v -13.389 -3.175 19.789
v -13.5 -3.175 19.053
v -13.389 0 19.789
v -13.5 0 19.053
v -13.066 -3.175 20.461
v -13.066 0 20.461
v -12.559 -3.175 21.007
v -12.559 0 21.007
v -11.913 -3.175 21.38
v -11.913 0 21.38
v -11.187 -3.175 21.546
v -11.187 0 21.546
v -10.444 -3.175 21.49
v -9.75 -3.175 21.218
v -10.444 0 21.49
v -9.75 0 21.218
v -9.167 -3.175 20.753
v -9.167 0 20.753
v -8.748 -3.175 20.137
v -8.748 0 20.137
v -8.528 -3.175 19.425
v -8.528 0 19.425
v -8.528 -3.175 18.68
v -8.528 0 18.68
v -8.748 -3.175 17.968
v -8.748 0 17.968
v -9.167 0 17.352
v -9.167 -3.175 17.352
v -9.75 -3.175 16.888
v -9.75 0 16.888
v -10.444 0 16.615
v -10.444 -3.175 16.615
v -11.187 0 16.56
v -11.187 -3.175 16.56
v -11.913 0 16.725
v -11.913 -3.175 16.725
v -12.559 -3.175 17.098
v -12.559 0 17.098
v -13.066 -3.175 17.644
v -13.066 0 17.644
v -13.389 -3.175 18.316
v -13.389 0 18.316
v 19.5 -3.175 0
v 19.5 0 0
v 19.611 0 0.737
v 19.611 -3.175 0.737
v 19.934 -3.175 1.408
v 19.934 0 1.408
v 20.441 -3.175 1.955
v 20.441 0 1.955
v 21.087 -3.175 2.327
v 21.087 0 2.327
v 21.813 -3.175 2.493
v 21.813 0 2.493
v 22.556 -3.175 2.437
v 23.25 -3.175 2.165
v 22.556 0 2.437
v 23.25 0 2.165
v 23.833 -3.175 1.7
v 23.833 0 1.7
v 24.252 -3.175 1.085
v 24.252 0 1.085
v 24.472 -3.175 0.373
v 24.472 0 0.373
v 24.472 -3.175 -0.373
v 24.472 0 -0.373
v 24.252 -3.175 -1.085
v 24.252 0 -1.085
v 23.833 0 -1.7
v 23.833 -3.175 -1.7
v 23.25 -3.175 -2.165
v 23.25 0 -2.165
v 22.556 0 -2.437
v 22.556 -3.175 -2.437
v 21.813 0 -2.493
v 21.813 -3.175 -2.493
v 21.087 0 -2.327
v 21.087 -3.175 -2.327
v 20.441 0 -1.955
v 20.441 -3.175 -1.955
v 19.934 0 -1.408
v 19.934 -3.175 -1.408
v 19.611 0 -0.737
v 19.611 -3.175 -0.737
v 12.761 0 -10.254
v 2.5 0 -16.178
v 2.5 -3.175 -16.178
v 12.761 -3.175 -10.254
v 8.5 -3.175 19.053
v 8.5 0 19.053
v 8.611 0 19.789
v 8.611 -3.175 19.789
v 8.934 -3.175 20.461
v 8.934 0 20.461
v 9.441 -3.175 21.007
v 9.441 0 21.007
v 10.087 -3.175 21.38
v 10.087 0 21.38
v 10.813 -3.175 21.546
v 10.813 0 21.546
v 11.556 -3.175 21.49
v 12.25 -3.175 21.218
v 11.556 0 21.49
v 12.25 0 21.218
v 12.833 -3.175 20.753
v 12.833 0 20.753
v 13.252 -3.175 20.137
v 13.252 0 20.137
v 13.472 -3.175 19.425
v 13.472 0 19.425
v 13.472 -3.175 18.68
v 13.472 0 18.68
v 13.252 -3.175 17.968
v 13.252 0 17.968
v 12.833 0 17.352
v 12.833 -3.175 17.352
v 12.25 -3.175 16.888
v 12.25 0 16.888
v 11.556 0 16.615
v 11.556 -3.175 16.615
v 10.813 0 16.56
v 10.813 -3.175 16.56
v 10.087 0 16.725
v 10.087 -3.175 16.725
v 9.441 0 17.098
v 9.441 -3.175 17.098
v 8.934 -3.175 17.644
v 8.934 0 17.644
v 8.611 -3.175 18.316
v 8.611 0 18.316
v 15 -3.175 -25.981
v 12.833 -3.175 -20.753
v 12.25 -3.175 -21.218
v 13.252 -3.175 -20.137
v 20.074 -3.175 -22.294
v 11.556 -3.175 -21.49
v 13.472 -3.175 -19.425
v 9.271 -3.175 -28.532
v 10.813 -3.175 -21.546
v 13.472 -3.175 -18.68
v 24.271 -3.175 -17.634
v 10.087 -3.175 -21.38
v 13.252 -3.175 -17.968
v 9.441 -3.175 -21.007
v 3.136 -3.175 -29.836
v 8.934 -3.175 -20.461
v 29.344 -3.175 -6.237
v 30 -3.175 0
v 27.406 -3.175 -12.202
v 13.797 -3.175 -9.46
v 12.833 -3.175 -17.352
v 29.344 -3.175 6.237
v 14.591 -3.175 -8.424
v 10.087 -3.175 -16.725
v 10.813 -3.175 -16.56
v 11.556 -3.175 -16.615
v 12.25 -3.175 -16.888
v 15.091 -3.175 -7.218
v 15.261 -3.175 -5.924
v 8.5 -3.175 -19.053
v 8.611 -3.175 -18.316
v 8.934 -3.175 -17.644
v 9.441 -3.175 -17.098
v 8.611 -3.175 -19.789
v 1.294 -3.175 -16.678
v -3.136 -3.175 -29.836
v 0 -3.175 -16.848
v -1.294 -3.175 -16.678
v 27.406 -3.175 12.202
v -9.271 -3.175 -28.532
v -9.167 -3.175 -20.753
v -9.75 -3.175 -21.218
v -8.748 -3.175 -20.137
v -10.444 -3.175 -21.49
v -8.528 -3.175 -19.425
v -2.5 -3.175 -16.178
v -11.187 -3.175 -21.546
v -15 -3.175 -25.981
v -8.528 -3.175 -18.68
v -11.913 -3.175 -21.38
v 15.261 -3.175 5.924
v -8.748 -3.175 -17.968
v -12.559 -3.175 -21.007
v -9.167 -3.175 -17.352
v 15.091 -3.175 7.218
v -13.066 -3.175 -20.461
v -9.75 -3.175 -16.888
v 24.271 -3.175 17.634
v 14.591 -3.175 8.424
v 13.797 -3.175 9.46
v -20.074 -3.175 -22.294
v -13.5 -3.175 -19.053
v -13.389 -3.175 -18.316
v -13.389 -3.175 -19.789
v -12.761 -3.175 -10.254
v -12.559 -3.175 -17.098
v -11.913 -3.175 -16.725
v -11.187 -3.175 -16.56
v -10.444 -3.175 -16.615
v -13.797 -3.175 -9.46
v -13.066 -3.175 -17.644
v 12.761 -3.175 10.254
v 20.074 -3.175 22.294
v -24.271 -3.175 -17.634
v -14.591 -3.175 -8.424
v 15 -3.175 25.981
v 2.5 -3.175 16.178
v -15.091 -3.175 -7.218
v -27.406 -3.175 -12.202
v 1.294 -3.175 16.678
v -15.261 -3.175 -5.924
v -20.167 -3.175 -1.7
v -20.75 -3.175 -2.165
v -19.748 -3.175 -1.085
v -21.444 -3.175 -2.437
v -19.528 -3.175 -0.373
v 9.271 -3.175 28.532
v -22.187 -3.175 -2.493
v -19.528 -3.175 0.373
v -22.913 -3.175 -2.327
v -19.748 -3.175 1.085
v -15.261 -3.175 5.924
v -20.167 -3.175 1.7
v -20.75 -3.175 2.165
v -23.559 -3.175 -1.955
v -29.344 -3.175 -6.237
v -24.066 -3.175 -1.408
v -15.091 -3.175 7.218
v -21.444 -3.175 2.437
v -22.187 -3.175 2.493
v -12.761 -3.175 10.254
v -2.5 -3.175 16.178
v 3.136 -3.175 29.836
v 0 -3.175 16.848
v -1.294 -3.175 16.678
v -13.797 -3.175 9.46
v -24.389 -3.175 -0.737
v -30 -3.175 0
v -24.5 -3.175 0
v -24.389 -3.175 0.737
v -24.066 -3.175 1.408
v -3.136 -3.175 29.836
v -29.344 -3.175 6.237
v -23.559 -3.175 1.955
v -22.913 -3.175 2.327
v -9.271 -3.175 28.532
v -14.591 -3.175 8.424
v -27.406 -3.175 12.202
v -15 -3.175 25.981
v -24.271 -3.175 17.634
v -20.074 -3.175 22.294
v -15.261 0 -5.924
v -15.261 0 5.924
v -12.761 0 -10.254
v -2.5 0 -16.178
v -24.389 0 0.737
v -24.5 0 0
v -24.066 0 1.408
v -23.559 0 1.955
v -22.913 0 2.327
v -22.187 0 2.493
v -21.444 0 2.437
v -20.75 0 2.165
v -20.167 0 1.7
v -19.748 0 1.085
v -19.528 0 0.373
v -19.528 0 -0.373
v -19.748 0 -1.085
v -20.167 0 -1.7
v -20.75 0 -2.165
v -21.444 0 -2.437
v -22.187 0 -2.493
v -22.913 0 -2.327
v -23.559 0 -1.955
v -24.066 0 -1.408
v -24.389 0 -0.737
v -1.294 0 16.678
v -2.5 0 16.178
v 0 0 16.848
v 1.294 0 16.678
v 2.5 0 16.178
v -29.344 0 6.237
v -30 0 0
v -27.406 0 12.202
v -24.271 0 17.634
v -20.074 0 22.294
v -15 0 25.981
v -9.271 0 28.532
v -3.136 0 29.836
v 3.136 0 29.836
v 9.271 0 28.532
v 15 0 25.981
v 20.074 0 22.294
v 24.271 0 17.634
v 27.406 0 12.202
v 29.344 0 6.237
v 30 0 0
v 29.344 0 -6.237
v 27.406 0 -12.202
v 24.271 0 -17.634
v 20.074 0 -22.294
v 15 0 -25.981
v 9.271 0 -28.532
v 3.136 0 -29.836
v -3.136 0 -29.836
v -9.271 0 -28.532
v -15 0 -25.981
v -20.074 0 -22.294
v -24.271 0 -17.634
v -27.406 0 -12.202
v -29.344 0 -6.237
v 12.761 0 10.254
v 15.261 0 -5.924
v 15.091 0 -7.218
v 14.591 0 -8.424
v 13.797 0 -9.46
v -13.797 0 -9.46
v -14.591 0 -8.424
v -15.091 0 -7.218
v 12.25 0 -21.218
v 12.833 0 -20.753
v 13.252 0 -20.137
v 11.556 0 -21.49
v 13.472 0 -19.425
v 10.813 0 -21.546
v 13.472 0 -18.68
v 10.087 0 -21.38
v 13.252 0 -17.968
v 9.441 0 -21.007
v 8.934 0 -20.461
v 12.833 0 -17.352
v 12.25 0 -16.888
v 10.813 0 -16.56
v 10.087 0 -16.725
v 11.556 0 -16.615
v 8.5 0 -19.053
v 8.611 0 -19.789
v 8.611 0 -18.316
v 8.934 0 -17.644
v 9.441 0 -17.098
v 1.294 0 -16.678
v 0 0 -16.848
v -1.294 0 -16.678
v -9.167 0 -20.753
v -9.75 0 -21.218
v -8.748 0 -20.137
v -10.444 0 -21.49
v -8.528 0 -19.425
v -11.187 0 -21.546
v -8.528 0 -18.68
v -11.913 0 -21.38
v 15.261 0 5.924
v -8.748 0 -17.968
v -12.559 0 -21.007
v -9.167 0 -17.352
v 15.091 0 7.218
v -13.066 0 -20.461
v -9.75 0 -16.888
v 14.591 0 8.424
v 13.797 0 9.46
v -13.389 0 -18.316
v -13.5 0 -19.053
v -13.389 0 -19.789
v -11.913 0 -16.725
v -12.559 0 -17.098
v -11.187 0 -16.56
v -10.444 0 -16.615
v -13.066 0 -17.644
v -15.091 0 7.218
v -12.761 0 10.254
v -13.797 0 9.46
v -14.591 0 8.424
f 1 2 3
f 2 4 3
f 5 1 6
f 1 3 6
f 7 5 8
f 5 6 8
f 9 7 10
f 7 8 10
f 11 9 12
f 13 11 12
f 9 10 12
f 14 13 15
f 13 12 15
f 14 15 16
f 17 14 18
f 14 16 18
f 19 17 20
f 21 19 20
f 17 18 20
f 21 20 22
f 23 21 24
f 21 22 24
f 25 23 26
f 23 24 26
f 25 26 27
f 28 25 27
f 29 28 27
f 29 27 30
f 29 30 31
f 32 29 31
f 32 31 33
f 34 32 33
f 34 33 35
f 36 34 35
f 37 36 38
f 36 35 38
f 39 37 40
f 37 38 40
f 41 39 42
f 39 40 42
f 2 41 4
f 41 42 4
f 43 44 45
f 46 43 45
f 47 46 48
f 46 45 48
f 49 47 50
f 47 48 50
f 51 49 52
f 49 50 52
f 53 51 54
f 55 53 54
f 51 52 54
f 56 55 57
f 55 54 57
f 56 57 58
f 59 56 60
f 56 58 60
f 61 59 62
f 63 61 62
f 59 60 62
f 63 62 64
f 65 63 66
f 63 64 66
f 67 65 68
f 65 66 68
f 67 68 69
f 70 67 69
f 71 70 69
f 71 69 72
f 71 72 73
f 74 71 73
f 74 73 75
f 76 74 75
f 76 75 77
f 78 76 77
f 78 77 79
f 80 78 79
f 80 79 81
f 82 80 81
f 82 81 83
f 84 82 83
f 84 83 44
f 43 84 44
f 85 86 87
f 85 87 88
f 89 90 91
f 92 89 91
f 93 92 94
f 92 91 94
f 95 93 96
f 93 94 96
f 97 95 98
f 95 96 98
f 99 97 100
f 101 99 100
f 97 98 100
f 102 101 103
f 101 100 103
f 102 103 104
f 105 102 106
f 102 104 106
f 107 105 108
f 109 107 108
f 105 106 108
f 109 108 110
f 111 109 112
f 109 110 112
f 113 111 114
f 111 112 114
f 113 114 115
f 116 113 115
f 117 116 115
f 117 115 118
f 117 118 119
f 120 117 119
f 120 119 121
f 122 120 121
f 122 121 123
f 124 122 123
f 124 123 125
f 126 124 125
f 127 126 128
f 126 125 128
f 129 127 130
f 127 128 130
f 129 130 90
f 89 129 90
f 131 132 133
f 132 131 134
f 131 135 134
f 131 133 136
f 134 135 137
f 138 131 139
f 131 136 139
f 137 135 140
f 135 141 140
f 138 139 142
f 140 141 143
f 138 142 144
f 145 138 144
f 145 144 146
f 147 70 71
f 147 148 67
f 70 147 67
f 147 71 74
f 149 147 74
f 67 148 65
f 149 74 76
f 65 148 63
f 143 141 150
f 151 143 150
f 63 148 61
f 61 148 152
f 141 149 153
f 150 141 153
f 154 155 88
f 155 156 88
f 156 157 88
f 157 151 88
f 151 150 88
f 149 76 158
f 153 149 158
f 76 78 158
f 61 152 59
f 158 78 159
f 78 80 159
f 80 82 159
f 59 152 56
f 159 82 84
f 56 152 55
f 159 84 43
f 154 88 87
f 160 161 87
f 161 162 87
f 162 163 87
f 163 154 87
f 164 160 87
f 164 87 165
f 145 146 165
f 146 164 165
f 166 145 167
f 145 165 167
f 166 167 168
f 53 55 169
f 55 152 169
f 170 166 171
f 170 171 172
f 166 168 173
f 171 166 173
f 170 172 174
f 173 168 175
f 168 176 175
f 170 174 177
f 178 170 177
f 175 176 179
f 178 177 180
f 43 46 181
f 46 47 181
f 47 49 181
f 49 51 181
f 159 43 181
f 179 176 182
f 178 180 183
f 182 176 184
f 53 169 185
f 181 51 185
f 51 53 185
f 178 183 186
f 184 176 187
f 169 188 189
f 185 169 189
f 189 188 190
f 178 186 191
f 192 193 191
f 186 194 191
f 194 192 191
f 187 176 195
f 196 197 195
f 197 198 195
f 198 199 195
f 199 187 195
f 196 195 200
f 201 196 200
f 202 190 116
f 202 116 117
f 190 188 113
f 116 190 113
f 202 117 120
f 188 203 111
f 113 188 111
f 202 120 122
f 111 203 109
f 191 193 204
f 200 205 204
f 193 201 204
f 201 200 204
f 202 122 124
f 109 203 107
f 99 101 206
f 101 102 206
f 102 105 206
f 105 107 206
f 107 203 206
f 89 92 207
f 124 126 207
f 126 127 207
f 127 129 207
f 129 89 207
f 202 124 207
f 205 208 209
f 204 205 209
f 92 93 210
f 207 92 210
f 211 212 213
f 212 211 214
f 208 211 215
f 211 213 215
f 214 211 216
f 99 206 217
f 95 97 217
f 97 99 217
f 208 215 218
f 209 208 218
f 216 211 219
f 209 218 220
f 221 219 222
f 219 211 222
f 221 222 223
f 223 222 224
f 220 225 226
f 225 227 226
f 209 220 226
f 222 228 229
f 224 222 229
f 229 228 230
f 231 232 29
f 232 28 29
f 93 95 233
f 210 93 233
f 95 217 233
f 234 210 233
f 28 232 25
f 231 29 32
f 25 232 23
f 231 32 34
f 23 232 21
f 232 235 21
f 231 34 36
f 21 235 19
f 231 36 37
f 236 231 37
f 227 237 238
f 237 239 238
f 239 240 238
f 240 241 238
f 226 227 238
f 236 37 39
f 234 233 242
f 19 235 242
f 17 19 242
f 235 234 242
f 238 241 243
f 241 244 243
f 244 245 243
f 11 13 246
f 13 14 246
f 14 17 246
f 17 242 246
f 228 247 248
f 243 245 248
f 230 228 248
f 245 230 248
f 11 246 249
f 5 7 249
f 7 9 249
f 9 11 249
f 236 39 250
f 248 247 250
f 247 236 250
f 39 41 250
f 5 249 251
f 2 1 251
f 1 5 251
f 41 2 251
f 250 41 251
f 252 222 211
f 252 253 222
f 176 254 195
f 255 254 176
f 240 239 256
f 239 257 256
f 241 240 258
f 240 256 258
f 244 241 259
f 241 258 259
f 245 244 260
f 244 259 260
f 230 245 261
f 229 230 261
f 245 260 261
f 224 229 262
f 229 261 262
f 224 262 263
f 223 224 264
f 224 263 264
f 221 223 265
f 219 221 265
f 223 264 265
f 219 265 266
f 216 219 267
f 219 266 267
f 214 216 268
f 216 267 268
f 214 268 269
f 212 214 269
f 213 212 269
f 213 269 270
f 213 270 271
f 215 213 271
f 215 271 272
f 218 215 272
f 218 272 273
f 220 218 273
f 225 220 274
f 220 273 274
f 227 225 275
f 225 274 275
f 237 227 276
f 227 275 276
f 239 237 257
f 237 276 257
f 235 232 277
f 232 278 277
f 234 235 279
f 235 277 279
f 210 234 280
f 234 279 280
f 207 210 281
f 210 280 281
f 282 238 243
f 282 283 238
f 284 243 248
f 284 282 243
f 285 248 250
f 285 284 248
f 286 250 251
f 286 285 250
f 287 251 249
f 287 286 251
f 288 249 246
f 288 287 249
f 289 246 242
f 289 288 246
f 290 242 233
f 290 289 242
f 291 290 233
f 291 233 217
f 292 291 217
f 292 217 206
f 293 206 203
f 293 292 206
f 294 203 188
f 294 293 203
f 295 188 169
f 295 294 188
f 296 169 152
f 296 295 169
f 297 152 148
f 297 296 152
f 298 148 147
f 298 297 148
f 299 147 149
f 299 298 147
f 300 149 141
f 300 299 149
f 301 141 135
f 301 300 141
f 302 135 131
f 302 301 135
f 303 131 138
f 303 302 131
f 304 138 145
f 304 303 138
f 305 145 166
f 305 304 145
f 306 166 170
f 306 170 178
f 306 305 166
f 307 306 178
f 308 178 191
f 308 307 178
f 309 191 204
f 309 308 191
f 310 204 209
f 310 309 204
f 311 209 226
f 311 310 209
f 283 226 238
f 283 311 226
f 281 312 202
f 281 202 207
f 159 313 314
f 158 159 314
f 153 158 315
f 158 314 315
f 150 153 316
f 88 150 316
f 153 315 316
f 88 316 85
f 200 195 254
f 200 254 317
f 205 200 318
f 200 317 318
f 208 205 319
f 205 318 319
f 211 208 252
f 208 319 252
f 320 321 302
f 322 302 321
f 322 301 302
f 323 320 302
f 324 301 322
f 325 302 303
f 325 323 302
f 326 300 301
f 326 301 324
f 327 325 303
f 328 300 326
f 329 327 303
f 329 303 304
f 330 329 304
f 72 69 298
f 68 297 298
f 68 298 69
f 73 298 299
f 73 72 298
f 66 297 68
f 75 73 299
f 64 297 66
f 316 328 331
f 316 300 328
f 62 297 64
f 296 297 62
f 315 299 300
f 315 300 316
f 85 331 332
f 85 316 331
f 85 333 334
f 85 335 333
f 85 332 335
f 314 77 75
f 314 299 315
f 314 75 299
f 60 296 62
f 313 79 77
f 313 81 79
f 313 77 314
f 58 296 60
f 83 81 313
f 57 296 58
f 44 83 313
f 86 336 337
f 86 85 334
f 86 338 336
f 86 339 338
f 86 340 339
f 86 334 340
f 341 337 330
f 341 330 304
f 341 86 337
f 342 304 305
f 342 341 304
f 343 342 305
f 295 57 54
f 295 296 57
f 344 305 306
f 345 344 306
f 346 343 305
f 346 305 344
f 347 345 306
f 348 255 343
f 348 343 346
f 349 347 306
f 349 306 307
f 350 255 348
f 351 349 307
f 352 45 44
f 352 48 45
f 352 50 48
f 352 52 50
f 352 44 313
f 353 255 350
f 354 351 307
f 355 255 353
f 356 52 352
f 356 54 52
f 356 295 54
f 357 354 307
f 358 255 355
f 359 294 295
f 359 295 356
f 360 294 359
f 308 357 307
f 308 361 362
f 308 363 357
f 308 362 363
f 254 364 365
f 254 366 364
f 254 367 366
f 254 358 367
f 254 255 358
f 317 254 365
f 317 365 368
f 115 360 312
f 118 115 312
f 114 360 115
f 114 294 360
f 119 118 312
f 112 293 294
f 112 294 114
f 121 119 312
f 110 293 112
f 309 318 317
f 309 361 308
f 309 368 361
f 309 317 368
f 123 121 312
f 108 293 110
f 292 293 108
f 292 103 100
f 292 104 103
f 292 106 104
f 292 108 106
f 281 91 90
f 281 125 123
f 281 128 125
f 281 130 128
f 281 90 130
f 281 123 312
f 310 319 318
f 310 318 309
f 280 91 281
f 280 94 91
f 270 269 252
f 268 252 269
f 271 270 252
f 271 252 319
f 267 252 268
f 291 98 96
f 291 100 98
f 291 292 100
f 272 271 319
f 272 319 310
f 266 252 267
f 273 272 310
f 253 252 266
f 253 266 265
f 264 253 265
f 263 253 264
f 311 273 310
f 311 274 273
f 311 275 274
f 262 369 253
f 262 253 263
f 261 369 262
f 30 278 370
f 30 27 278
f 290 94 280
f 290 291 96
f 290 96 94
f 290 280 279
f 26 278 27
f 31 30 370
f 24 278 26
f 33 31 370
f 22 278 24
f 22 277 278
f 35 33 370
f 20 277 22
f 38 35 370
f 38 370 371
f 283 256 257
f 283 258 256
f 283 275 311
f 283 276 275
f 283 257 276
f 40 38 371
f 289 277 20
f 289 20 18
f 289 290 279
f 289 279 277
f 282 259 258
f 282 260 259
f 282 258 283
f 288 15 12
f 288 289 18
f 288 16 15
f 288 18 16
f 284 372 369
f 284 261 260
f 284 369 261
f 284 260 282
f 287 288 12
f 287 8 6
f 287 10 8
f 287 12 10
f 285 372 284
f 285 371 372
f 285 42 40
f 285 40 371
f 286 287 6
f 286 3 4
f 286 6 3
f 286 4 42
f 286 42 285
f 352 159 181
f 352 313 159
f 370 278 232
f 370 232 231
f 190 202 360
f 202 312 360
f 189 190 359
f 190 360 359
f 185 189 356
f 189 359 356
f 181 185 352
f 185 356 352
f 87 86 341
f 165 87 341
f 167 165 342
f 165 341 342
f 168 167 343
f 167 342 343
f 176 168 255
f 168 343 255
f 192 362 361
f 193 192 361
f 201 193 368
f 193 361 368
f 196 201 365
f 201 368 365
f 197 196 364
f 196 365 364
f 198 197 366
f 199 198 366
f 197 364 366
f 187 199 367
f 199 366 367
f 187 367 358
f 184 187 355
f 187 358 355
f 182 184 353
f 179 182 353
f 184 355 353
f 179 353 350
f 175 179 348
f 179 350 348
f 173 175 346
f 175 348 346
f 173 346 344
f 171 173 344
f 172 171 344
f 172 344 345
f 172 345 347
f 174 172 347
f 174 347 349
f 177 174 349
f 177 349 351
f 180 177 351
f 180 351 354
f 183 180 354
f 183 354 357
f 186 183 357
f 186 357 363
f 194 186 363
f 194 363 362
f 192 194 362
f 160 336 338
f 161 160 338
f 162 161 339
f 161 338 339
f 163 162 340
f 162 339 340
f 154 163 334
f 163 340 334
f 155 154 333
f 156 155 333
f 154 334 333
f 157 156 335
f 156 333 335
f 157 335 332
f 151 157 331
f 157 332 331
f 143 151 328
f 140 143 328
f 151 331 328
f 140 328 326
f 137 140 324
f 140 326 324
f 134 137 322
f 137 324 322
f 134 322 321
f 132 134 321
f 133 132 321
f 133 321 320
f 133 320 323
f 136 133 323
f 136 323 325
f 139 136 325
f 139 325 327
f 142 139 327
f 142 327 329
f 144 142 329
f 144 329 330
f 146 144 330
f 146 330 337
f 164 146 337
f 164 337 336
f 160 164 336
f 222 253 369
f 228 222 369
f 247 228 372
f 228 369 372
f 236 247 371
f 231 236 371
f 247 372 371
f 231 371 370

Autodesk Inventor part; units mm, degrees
ref_plane "YZ Plane" through (0, 0, 0) normal (1, 0, 0) x (0, 1, 0)
ref_plane "XZ Plane" through (0, 0, 0) normal (0, 1, 0) x (-1, 0, 0)
ref_plane "XY Plane" through (0, 0, 0) normal (0, 0, 1) x (1, 0, 0)
sketch "Esquisse1" plane through (0, 0, 0) normal (0, 1, 0) x (-1, 0, 0)
  line L0 (0, -42) -> (0, 42) construction
  circle A0 centre (0, 0) radius 30
  circle A1 centre (22, 0) radius 2.5
  circle A2 centre (11, 19.0526) radius 2.5
  circle A3 centre (-11, 19.0526) radius 2.5
  circle A4 centre (-22, 0) radius 2.5
  circle A5 centre (-11, -19.0526) radius 2.5
  circle A6 centre (11, -19.0526) radius 2.5
  line L1 (17.9263, -5.3263) -> (22, 0) construction
  line L2 (-2.5, -16.1785) -> (-12.761, -10.2543)
  line L3 (-15.261, -5.9242) -> (-15.261, 5.9242)
  line L4 (-12.761, 10.2543) -> (-2.5, 16.1785)
  line L5 (2.5, 16.1785) -> (12.761, 10.2543)
  line L6 (15.261, 5.9242) -> (15.261, -5.9242)
  line L7 (12.761, -10.2543) -> (2.5, -16.1785)
  arc A7 (2.5, 16.1785) -> (-2.5, 16.1785) centre (0, 11.8484) ccw
  arc A8 (15.261, 5.9242) -> (12.761, 10.2543) centre (10.261, 5.9242) ccw
  arc A9 (12.761, -10.2543) -> (15.261, -5.9242) centre (10.261, -5.9242) ccw
  arc A10 (-2.5, -16.1785) -> (2.5, -16.1785) centre (0, -11.8484) ccw
  arc A11 (-15.261, -5.9242) -> (-12.761, -10.2543) centre (-10.261, -5.9242) ccw
  arc A12 (-12.761, 10.2543) -> (-15.261, 5.9242) centre (-10.261, 5.9242) ccw
  line L8 (0, 0) -> (10.261, -5.9242) construction
  line L9 (22, 0) -> (0, 0) construction
  point P0 (0, -17.6219)
  point P1 (-15.261, -8.8109)
  point P2 (-15.261, 8.8109)
  point P3 (0, 17.6219)
  point P4 (15.261, 8.8109)
  point P5 (15.261, -8.8109)
  dimension "d0" = 60
  dimension "d6" = 360
  dimension "d10" = 22
  dimension "d21" = 5
  dimension "d30" = 5
  dimension "d31" = 30
extrude "Extrusion1" add sketch "Esquisse1" against normal blind 3.175
equation "\"d8\" = d_aluminum_thickness"
equation "\"d_profile_section\" = 40"
equation "\"d_prfc_thickness\" = 3"
equation "\"d_front_arm_od\" = 31.75"
equation "\"d_front_arm_id\" = 29.2608"
equation "\"d_arm_length\" = 250"
equation "\"d_suspension_height\" = 140"
equation "\"d_aluminum_thickness\" = 3.175"
equation "\"d_suspension_box_width\" = 40"
equation "\"d_wheelbase\" = 1600"
equation "\"a_tilt\" = 10deg"
equation "\"d_rear_profile_width\" = 50.8"
equation "\"d_rear_profile_height\" = 101.6"
equation "\"d_central_profile_width\" = 50.8"
equation "\"d_central_profile_height\" = 101.6"
equation "\"d_handle_bar_od\" = 38.1"
equation "\"d_handle_bar_id\" = 30"
equation "\"a_direction_column\" = 35deg"
equation "\"front_suspension_height\" = 140.92977"
equation "\"front_suspension_width\" = 150"
equation "\"a_caster_angle\" = 25deg"
equation "\"d_handlebar_arm_length\" = 80"
equation "\"d_handlebar_pivot_offset\" = 65"
equation "\"a_handlebar_angle\" = 60deg"
equation "\"d_left_to_right_front_pivots\" = 28"
equation "\"d_aluminum_bar_thickness\" = 12.7"
equation "\"d_steering_arm_length\" = 70"
equation "\"d_steering_height_from_hub_carrier_center\" = 18"
equation "\"d_central_beam_inclination\" = 12"
equation "\"a_central_beam_inclination\" = 12deg"
equation "\"d_central_beam_screws_diameter\" = 8"
equation "\"d_rear_profile_wall_thickness\" = 4.7625"
equation "\"d_rear_profile_wall_thickness_1\" = 4.7625"
equation "\"d_central_pivot_screw_diameter\" = 15.875"
properties part number "Wheel_external_hub_ring" material "Aluminium 6061"
